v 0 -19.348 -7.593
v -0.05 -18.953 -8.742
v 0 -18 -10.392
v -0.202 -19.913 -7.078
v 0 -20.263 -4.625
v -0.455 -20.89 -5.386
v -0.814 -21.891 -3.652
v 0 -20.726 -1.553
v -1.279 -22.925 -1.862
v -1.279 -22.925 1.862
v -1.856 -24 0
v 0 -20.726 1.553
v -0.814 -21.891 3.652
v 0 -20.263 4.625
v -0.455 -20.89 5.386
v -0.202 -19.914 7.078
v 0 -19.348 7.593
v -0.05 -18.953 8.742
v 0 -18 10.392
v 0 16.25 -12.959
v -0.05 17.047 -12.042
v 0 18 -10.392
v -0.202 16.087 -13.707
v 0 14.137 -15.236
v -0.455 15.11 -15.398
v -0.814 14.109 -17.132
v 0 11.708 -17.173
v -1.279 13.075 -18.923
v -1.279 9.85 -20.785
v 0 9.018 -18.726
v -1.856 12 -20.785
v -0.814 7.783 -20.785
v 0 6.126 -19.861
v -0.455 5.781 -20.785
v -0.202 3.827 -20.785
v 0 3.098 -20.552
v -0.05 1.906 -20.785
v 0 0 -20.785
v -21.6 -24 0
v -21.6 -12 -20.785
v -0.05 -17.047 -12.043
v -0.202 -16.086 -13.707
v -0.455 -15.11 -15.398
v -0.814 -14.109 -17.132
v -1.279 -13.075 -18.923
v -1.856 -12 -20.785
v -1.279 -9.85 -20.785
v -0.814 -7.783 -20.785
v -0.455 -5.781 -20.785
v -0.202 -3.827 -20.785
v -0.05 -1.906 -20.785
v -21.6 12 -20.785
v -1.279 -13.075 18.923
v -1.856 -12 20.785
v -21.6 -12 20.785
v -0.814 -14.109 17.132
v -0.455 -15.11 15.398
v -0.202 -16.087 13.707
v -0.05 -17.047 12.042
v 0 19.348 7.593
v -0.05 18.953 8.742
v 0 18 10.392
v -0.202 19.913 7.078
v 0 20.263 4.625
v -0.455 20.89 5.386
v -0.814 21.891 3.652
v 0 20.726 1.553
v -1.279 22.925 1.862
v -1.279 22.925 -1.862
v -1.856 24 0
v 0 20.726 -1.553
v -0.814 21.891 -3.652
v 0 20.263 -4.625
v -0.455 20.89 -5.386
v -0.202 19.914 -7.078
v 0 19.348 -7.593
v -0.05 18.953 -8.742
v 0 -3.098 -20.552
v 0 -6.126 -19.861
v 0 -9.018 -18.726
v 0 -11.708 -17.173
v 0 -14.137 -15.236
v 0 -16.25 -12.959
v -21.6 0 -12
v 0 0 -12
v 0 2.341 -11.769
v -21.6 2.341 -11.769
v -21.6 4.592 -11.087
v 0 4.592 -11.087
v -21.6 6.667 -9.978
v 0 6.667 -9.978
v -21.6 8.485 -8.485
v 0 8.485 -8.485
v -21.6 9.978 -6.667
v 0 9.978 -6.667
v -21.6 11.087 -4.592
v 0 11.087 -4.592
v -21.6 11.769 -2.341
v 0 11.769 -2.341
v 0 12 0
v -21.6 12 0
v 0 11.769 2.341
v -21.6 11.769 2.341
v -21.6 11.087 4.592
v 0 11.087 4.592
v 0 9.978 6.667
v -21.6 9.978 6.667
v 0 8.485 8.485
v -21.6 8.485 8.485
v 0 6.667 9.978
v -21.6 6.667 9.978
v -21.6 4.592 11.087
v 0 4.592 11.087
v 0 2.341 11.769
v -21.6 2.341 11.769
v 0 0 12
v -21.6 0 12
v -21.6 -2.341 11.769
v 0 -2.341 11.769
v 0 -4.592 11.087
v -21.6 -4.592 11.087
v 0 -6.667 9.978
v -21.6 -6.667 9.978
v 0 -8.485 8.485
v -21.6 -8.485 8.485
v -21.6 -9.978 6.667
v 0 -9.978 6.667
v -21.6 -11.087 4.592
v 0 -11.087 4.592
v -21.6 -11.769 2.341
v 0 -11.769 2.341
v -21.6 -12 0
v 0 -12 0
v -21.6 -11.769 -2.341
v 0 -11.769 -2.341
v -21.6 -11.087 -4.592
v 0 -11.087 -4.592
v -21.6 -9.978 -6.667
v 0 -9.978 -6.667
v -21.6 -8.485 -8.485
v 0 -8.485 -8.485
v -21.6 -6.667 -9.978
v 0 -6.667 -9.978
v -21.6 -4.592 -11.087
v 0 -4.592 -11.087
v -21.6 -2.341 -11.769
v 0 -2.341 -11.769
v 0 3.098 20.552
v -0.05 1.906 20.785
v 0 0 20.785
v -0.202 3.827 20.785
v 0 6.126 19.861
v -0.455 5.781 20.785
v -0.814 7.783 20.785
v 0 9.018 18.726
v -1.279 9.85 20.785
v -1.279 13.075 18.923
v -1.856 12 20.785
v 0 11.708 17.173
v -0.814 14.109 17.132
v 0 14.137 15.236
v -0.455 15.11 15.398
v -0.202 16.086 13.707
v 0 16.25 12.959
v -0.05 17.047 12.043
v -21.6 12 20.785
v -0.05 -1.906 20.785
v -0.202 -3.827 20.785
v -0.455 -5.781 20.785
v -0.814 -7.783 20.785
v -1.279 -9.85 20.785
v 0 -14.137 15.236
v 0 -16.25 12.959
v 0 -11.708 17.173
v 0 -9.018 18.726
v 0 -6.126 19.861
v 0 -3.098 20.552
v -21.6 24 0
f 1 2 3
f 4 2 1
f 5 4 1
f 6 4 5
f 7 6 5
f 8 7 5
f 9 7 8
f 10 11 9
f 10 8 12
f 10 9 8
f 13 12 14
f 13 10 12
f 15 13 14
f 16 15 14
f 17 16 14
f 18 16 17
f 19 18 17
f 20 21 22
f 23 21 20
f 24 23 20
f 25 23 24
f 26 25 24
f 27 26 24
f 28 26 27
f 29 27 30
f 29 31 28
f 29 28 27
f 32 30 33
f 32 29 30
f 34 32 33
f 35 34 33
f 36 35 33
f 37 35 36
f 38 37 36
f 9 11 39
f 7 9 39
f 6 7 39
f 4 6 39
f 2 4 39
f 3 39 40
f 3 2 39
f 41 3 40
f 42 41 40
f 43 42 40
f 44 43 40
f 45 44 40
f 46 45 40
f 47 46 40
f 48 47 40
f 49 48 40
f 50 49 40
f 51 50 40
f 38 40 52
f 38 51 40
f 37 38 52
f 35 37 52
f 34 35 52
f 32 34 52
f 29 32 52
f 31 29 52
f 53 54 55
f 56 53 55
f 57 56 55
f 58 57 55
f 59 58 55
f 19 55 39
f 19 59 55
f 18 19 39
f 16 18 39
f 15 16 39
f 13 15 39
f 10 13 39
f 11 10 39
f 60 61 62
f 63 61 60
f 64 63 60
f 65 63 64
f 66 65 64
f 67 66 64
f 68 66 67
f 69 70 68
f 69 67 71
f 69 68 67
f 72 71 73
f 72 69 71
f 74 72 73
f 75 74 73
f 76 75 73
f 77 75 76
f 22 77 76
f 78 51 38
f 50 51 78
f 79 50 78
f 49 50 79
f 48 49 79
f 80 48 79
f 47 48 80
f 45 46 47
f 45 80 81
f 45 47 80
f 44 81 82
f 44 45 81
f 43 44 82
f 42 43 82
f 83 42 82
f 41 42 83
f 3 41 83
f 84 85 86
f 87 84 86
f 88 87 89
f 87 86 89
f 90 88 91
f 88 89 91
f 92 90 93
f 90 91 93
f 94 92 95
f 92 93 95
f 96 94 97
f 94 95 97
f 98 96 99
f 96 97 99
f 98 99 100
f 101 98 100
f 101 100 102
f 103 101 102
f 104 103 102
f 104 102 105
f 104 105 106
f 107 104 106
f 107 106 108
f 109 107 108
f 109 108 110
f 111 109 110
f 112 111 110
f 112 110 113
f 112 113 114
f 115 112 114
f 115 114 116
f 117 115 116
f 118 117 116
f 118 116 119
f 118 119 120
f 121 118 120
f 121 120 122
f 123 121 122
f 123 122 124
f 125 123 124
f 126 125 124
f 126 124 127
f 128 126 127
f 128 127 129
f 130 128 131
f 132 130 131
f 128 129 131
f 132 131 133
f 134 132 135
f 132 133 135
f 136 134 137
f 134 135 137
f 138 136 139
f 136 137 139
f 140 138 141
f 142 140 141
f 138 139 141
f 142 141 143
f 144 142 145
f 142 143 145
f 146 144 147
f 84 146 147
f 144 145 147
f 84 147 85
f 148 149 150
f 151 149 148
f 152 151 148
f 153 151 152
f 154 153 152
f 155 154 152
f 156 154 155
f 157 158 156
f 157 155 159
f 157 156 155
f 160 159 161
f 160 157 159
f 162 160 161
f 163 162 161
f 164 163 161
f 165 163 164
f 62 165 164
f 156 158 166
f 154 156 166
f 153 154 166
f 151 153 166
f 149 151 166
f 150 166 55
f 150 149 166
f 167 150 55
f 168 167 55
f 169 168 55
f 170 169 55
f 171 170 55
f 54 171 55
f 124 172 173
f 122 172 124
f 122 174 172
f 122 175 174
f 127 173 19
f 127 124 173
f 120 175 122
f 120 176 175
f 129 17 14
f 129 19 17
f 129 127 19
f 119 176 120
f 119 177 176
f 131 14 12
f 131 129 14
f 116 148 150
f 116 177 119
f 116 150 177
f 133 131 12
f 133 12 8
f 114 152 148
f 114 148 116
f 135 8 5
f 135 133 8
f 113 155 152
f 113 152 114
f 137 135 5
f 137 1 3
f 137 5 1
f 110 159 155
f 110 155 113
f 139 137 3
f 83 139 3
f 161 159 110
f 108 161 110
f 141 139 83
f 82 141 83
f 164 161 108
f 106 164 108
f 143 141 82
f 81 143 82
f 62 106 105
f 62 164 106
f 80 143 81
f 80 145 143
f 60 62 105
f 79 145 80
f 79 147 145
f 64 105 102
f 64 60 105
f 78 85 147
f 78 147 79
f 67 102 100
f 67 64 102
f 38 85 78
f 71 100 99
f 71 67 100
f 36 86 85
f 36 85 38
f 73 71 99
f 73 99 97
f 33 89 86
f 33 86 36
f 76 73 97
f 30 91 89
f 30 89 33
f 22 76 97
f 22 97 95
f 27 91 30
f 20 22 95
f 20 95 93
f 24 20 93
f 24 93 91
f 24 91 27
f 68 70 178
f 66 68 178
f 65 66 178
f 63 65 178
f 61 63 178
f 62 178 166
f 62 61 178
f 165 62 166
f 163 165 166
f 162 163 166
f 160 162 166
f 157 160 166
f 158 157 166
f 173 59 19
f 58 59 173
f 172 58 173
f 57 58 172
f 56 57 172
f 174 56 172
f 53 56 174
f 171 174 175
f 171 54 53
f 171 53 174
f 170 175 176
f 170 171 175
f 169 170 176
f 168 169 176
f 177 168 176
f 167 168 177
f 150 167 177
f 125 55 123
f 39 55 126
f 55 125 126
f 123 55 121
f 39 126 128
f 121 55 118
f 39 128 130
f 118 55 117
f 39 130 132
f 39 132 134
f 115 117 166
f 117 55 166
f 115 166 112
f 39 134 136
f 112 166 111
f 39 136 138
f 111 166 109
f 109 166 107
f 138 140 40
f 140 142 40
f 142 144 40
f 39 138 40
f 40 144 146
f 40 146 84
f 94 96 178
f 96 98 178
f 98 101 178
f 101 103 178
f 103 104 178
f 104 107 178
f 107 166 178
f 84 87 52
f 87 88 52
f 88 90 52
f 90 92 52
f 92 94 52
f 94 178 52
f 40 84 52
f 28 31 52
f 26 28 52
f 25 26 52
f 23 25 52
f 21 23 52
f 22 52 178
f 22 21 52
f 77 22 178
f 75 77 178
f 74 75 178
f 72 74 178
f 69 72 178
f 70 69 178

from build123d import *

# Parameters (mm, degrees)
BOSS_EXTRUDE1_DEPTH = 21.6
CUT_EXTRUDE1_REACH  = 23.6
SKETCH2_R           = 12
SKETCH3_OUTSIDE_W   = 135.272
SKETCH3_OUTSIDE_H   = 141.702
SKETCH3_OUTSIDE_R   = 20.784609691
CUT_EXTRUDE2_DEPTH  = 22.6
CUT_EXTRUDE2_TAPER  = 60


with BuildPart() as part:
    # Sketch1 → Boss-Extrude1 (new body)
    with BuildSketch(Plane(origin=(0, 0, 0), x_dir=(0, 0, -1), z_dir=(1, 0, 0))):
        Polygon((0, 24), (-20.784609691, 12), (-20.784609691, -12), (0, -24), (20.784609691, -12), (20.784609691, 12), align=None)
    extrude(amount=-BOSS_EXTRUDE1_DEPTH)

    # Sketch2 → Cut-Extrude1 (cut, up to next)
    with BuildSketch(Plane(origin=(0, 0, 0), x_dir=(0, 0, -1), z_dir=(1, 0, 0)), mode=Mode.PRIVATE) as cut_extrude1_sk1:
        Circle(SKETCH2_R)
    cut_extrude1_tool1 = extrude(cut_extrude1_sk1.sketch, amount=-CUT_EXTRUDE1_REACH, mode=Mode.PRIVATE) & part.part
    add(cut_extrude1_tool1.solids().sort_by_distance((0, 0, 0))[0], mode=Mode.SUBTRACT)

    # Sketch3 outside → Cut-Extrude2 (cut, through all)
    with BuildSketch(Plane(origin=(0, 0, 0), x_dir=(0, 0, -1), z_dir=(1, 0, 0))):
        Rectangle(SKETCH3_OUTSIDE_W, SKETCH3_OUTSIDE_H)
        Circle(SKETCH3_OUTSIDE_R, mode=Mode.SUBTRACT)
    extrude(amount=-CUT_EXTRUDE2_DEPTH, taper=CUT_EXTRUDE2_TAPER, mode=Mode.SUBTRACT)


solid = part.part
